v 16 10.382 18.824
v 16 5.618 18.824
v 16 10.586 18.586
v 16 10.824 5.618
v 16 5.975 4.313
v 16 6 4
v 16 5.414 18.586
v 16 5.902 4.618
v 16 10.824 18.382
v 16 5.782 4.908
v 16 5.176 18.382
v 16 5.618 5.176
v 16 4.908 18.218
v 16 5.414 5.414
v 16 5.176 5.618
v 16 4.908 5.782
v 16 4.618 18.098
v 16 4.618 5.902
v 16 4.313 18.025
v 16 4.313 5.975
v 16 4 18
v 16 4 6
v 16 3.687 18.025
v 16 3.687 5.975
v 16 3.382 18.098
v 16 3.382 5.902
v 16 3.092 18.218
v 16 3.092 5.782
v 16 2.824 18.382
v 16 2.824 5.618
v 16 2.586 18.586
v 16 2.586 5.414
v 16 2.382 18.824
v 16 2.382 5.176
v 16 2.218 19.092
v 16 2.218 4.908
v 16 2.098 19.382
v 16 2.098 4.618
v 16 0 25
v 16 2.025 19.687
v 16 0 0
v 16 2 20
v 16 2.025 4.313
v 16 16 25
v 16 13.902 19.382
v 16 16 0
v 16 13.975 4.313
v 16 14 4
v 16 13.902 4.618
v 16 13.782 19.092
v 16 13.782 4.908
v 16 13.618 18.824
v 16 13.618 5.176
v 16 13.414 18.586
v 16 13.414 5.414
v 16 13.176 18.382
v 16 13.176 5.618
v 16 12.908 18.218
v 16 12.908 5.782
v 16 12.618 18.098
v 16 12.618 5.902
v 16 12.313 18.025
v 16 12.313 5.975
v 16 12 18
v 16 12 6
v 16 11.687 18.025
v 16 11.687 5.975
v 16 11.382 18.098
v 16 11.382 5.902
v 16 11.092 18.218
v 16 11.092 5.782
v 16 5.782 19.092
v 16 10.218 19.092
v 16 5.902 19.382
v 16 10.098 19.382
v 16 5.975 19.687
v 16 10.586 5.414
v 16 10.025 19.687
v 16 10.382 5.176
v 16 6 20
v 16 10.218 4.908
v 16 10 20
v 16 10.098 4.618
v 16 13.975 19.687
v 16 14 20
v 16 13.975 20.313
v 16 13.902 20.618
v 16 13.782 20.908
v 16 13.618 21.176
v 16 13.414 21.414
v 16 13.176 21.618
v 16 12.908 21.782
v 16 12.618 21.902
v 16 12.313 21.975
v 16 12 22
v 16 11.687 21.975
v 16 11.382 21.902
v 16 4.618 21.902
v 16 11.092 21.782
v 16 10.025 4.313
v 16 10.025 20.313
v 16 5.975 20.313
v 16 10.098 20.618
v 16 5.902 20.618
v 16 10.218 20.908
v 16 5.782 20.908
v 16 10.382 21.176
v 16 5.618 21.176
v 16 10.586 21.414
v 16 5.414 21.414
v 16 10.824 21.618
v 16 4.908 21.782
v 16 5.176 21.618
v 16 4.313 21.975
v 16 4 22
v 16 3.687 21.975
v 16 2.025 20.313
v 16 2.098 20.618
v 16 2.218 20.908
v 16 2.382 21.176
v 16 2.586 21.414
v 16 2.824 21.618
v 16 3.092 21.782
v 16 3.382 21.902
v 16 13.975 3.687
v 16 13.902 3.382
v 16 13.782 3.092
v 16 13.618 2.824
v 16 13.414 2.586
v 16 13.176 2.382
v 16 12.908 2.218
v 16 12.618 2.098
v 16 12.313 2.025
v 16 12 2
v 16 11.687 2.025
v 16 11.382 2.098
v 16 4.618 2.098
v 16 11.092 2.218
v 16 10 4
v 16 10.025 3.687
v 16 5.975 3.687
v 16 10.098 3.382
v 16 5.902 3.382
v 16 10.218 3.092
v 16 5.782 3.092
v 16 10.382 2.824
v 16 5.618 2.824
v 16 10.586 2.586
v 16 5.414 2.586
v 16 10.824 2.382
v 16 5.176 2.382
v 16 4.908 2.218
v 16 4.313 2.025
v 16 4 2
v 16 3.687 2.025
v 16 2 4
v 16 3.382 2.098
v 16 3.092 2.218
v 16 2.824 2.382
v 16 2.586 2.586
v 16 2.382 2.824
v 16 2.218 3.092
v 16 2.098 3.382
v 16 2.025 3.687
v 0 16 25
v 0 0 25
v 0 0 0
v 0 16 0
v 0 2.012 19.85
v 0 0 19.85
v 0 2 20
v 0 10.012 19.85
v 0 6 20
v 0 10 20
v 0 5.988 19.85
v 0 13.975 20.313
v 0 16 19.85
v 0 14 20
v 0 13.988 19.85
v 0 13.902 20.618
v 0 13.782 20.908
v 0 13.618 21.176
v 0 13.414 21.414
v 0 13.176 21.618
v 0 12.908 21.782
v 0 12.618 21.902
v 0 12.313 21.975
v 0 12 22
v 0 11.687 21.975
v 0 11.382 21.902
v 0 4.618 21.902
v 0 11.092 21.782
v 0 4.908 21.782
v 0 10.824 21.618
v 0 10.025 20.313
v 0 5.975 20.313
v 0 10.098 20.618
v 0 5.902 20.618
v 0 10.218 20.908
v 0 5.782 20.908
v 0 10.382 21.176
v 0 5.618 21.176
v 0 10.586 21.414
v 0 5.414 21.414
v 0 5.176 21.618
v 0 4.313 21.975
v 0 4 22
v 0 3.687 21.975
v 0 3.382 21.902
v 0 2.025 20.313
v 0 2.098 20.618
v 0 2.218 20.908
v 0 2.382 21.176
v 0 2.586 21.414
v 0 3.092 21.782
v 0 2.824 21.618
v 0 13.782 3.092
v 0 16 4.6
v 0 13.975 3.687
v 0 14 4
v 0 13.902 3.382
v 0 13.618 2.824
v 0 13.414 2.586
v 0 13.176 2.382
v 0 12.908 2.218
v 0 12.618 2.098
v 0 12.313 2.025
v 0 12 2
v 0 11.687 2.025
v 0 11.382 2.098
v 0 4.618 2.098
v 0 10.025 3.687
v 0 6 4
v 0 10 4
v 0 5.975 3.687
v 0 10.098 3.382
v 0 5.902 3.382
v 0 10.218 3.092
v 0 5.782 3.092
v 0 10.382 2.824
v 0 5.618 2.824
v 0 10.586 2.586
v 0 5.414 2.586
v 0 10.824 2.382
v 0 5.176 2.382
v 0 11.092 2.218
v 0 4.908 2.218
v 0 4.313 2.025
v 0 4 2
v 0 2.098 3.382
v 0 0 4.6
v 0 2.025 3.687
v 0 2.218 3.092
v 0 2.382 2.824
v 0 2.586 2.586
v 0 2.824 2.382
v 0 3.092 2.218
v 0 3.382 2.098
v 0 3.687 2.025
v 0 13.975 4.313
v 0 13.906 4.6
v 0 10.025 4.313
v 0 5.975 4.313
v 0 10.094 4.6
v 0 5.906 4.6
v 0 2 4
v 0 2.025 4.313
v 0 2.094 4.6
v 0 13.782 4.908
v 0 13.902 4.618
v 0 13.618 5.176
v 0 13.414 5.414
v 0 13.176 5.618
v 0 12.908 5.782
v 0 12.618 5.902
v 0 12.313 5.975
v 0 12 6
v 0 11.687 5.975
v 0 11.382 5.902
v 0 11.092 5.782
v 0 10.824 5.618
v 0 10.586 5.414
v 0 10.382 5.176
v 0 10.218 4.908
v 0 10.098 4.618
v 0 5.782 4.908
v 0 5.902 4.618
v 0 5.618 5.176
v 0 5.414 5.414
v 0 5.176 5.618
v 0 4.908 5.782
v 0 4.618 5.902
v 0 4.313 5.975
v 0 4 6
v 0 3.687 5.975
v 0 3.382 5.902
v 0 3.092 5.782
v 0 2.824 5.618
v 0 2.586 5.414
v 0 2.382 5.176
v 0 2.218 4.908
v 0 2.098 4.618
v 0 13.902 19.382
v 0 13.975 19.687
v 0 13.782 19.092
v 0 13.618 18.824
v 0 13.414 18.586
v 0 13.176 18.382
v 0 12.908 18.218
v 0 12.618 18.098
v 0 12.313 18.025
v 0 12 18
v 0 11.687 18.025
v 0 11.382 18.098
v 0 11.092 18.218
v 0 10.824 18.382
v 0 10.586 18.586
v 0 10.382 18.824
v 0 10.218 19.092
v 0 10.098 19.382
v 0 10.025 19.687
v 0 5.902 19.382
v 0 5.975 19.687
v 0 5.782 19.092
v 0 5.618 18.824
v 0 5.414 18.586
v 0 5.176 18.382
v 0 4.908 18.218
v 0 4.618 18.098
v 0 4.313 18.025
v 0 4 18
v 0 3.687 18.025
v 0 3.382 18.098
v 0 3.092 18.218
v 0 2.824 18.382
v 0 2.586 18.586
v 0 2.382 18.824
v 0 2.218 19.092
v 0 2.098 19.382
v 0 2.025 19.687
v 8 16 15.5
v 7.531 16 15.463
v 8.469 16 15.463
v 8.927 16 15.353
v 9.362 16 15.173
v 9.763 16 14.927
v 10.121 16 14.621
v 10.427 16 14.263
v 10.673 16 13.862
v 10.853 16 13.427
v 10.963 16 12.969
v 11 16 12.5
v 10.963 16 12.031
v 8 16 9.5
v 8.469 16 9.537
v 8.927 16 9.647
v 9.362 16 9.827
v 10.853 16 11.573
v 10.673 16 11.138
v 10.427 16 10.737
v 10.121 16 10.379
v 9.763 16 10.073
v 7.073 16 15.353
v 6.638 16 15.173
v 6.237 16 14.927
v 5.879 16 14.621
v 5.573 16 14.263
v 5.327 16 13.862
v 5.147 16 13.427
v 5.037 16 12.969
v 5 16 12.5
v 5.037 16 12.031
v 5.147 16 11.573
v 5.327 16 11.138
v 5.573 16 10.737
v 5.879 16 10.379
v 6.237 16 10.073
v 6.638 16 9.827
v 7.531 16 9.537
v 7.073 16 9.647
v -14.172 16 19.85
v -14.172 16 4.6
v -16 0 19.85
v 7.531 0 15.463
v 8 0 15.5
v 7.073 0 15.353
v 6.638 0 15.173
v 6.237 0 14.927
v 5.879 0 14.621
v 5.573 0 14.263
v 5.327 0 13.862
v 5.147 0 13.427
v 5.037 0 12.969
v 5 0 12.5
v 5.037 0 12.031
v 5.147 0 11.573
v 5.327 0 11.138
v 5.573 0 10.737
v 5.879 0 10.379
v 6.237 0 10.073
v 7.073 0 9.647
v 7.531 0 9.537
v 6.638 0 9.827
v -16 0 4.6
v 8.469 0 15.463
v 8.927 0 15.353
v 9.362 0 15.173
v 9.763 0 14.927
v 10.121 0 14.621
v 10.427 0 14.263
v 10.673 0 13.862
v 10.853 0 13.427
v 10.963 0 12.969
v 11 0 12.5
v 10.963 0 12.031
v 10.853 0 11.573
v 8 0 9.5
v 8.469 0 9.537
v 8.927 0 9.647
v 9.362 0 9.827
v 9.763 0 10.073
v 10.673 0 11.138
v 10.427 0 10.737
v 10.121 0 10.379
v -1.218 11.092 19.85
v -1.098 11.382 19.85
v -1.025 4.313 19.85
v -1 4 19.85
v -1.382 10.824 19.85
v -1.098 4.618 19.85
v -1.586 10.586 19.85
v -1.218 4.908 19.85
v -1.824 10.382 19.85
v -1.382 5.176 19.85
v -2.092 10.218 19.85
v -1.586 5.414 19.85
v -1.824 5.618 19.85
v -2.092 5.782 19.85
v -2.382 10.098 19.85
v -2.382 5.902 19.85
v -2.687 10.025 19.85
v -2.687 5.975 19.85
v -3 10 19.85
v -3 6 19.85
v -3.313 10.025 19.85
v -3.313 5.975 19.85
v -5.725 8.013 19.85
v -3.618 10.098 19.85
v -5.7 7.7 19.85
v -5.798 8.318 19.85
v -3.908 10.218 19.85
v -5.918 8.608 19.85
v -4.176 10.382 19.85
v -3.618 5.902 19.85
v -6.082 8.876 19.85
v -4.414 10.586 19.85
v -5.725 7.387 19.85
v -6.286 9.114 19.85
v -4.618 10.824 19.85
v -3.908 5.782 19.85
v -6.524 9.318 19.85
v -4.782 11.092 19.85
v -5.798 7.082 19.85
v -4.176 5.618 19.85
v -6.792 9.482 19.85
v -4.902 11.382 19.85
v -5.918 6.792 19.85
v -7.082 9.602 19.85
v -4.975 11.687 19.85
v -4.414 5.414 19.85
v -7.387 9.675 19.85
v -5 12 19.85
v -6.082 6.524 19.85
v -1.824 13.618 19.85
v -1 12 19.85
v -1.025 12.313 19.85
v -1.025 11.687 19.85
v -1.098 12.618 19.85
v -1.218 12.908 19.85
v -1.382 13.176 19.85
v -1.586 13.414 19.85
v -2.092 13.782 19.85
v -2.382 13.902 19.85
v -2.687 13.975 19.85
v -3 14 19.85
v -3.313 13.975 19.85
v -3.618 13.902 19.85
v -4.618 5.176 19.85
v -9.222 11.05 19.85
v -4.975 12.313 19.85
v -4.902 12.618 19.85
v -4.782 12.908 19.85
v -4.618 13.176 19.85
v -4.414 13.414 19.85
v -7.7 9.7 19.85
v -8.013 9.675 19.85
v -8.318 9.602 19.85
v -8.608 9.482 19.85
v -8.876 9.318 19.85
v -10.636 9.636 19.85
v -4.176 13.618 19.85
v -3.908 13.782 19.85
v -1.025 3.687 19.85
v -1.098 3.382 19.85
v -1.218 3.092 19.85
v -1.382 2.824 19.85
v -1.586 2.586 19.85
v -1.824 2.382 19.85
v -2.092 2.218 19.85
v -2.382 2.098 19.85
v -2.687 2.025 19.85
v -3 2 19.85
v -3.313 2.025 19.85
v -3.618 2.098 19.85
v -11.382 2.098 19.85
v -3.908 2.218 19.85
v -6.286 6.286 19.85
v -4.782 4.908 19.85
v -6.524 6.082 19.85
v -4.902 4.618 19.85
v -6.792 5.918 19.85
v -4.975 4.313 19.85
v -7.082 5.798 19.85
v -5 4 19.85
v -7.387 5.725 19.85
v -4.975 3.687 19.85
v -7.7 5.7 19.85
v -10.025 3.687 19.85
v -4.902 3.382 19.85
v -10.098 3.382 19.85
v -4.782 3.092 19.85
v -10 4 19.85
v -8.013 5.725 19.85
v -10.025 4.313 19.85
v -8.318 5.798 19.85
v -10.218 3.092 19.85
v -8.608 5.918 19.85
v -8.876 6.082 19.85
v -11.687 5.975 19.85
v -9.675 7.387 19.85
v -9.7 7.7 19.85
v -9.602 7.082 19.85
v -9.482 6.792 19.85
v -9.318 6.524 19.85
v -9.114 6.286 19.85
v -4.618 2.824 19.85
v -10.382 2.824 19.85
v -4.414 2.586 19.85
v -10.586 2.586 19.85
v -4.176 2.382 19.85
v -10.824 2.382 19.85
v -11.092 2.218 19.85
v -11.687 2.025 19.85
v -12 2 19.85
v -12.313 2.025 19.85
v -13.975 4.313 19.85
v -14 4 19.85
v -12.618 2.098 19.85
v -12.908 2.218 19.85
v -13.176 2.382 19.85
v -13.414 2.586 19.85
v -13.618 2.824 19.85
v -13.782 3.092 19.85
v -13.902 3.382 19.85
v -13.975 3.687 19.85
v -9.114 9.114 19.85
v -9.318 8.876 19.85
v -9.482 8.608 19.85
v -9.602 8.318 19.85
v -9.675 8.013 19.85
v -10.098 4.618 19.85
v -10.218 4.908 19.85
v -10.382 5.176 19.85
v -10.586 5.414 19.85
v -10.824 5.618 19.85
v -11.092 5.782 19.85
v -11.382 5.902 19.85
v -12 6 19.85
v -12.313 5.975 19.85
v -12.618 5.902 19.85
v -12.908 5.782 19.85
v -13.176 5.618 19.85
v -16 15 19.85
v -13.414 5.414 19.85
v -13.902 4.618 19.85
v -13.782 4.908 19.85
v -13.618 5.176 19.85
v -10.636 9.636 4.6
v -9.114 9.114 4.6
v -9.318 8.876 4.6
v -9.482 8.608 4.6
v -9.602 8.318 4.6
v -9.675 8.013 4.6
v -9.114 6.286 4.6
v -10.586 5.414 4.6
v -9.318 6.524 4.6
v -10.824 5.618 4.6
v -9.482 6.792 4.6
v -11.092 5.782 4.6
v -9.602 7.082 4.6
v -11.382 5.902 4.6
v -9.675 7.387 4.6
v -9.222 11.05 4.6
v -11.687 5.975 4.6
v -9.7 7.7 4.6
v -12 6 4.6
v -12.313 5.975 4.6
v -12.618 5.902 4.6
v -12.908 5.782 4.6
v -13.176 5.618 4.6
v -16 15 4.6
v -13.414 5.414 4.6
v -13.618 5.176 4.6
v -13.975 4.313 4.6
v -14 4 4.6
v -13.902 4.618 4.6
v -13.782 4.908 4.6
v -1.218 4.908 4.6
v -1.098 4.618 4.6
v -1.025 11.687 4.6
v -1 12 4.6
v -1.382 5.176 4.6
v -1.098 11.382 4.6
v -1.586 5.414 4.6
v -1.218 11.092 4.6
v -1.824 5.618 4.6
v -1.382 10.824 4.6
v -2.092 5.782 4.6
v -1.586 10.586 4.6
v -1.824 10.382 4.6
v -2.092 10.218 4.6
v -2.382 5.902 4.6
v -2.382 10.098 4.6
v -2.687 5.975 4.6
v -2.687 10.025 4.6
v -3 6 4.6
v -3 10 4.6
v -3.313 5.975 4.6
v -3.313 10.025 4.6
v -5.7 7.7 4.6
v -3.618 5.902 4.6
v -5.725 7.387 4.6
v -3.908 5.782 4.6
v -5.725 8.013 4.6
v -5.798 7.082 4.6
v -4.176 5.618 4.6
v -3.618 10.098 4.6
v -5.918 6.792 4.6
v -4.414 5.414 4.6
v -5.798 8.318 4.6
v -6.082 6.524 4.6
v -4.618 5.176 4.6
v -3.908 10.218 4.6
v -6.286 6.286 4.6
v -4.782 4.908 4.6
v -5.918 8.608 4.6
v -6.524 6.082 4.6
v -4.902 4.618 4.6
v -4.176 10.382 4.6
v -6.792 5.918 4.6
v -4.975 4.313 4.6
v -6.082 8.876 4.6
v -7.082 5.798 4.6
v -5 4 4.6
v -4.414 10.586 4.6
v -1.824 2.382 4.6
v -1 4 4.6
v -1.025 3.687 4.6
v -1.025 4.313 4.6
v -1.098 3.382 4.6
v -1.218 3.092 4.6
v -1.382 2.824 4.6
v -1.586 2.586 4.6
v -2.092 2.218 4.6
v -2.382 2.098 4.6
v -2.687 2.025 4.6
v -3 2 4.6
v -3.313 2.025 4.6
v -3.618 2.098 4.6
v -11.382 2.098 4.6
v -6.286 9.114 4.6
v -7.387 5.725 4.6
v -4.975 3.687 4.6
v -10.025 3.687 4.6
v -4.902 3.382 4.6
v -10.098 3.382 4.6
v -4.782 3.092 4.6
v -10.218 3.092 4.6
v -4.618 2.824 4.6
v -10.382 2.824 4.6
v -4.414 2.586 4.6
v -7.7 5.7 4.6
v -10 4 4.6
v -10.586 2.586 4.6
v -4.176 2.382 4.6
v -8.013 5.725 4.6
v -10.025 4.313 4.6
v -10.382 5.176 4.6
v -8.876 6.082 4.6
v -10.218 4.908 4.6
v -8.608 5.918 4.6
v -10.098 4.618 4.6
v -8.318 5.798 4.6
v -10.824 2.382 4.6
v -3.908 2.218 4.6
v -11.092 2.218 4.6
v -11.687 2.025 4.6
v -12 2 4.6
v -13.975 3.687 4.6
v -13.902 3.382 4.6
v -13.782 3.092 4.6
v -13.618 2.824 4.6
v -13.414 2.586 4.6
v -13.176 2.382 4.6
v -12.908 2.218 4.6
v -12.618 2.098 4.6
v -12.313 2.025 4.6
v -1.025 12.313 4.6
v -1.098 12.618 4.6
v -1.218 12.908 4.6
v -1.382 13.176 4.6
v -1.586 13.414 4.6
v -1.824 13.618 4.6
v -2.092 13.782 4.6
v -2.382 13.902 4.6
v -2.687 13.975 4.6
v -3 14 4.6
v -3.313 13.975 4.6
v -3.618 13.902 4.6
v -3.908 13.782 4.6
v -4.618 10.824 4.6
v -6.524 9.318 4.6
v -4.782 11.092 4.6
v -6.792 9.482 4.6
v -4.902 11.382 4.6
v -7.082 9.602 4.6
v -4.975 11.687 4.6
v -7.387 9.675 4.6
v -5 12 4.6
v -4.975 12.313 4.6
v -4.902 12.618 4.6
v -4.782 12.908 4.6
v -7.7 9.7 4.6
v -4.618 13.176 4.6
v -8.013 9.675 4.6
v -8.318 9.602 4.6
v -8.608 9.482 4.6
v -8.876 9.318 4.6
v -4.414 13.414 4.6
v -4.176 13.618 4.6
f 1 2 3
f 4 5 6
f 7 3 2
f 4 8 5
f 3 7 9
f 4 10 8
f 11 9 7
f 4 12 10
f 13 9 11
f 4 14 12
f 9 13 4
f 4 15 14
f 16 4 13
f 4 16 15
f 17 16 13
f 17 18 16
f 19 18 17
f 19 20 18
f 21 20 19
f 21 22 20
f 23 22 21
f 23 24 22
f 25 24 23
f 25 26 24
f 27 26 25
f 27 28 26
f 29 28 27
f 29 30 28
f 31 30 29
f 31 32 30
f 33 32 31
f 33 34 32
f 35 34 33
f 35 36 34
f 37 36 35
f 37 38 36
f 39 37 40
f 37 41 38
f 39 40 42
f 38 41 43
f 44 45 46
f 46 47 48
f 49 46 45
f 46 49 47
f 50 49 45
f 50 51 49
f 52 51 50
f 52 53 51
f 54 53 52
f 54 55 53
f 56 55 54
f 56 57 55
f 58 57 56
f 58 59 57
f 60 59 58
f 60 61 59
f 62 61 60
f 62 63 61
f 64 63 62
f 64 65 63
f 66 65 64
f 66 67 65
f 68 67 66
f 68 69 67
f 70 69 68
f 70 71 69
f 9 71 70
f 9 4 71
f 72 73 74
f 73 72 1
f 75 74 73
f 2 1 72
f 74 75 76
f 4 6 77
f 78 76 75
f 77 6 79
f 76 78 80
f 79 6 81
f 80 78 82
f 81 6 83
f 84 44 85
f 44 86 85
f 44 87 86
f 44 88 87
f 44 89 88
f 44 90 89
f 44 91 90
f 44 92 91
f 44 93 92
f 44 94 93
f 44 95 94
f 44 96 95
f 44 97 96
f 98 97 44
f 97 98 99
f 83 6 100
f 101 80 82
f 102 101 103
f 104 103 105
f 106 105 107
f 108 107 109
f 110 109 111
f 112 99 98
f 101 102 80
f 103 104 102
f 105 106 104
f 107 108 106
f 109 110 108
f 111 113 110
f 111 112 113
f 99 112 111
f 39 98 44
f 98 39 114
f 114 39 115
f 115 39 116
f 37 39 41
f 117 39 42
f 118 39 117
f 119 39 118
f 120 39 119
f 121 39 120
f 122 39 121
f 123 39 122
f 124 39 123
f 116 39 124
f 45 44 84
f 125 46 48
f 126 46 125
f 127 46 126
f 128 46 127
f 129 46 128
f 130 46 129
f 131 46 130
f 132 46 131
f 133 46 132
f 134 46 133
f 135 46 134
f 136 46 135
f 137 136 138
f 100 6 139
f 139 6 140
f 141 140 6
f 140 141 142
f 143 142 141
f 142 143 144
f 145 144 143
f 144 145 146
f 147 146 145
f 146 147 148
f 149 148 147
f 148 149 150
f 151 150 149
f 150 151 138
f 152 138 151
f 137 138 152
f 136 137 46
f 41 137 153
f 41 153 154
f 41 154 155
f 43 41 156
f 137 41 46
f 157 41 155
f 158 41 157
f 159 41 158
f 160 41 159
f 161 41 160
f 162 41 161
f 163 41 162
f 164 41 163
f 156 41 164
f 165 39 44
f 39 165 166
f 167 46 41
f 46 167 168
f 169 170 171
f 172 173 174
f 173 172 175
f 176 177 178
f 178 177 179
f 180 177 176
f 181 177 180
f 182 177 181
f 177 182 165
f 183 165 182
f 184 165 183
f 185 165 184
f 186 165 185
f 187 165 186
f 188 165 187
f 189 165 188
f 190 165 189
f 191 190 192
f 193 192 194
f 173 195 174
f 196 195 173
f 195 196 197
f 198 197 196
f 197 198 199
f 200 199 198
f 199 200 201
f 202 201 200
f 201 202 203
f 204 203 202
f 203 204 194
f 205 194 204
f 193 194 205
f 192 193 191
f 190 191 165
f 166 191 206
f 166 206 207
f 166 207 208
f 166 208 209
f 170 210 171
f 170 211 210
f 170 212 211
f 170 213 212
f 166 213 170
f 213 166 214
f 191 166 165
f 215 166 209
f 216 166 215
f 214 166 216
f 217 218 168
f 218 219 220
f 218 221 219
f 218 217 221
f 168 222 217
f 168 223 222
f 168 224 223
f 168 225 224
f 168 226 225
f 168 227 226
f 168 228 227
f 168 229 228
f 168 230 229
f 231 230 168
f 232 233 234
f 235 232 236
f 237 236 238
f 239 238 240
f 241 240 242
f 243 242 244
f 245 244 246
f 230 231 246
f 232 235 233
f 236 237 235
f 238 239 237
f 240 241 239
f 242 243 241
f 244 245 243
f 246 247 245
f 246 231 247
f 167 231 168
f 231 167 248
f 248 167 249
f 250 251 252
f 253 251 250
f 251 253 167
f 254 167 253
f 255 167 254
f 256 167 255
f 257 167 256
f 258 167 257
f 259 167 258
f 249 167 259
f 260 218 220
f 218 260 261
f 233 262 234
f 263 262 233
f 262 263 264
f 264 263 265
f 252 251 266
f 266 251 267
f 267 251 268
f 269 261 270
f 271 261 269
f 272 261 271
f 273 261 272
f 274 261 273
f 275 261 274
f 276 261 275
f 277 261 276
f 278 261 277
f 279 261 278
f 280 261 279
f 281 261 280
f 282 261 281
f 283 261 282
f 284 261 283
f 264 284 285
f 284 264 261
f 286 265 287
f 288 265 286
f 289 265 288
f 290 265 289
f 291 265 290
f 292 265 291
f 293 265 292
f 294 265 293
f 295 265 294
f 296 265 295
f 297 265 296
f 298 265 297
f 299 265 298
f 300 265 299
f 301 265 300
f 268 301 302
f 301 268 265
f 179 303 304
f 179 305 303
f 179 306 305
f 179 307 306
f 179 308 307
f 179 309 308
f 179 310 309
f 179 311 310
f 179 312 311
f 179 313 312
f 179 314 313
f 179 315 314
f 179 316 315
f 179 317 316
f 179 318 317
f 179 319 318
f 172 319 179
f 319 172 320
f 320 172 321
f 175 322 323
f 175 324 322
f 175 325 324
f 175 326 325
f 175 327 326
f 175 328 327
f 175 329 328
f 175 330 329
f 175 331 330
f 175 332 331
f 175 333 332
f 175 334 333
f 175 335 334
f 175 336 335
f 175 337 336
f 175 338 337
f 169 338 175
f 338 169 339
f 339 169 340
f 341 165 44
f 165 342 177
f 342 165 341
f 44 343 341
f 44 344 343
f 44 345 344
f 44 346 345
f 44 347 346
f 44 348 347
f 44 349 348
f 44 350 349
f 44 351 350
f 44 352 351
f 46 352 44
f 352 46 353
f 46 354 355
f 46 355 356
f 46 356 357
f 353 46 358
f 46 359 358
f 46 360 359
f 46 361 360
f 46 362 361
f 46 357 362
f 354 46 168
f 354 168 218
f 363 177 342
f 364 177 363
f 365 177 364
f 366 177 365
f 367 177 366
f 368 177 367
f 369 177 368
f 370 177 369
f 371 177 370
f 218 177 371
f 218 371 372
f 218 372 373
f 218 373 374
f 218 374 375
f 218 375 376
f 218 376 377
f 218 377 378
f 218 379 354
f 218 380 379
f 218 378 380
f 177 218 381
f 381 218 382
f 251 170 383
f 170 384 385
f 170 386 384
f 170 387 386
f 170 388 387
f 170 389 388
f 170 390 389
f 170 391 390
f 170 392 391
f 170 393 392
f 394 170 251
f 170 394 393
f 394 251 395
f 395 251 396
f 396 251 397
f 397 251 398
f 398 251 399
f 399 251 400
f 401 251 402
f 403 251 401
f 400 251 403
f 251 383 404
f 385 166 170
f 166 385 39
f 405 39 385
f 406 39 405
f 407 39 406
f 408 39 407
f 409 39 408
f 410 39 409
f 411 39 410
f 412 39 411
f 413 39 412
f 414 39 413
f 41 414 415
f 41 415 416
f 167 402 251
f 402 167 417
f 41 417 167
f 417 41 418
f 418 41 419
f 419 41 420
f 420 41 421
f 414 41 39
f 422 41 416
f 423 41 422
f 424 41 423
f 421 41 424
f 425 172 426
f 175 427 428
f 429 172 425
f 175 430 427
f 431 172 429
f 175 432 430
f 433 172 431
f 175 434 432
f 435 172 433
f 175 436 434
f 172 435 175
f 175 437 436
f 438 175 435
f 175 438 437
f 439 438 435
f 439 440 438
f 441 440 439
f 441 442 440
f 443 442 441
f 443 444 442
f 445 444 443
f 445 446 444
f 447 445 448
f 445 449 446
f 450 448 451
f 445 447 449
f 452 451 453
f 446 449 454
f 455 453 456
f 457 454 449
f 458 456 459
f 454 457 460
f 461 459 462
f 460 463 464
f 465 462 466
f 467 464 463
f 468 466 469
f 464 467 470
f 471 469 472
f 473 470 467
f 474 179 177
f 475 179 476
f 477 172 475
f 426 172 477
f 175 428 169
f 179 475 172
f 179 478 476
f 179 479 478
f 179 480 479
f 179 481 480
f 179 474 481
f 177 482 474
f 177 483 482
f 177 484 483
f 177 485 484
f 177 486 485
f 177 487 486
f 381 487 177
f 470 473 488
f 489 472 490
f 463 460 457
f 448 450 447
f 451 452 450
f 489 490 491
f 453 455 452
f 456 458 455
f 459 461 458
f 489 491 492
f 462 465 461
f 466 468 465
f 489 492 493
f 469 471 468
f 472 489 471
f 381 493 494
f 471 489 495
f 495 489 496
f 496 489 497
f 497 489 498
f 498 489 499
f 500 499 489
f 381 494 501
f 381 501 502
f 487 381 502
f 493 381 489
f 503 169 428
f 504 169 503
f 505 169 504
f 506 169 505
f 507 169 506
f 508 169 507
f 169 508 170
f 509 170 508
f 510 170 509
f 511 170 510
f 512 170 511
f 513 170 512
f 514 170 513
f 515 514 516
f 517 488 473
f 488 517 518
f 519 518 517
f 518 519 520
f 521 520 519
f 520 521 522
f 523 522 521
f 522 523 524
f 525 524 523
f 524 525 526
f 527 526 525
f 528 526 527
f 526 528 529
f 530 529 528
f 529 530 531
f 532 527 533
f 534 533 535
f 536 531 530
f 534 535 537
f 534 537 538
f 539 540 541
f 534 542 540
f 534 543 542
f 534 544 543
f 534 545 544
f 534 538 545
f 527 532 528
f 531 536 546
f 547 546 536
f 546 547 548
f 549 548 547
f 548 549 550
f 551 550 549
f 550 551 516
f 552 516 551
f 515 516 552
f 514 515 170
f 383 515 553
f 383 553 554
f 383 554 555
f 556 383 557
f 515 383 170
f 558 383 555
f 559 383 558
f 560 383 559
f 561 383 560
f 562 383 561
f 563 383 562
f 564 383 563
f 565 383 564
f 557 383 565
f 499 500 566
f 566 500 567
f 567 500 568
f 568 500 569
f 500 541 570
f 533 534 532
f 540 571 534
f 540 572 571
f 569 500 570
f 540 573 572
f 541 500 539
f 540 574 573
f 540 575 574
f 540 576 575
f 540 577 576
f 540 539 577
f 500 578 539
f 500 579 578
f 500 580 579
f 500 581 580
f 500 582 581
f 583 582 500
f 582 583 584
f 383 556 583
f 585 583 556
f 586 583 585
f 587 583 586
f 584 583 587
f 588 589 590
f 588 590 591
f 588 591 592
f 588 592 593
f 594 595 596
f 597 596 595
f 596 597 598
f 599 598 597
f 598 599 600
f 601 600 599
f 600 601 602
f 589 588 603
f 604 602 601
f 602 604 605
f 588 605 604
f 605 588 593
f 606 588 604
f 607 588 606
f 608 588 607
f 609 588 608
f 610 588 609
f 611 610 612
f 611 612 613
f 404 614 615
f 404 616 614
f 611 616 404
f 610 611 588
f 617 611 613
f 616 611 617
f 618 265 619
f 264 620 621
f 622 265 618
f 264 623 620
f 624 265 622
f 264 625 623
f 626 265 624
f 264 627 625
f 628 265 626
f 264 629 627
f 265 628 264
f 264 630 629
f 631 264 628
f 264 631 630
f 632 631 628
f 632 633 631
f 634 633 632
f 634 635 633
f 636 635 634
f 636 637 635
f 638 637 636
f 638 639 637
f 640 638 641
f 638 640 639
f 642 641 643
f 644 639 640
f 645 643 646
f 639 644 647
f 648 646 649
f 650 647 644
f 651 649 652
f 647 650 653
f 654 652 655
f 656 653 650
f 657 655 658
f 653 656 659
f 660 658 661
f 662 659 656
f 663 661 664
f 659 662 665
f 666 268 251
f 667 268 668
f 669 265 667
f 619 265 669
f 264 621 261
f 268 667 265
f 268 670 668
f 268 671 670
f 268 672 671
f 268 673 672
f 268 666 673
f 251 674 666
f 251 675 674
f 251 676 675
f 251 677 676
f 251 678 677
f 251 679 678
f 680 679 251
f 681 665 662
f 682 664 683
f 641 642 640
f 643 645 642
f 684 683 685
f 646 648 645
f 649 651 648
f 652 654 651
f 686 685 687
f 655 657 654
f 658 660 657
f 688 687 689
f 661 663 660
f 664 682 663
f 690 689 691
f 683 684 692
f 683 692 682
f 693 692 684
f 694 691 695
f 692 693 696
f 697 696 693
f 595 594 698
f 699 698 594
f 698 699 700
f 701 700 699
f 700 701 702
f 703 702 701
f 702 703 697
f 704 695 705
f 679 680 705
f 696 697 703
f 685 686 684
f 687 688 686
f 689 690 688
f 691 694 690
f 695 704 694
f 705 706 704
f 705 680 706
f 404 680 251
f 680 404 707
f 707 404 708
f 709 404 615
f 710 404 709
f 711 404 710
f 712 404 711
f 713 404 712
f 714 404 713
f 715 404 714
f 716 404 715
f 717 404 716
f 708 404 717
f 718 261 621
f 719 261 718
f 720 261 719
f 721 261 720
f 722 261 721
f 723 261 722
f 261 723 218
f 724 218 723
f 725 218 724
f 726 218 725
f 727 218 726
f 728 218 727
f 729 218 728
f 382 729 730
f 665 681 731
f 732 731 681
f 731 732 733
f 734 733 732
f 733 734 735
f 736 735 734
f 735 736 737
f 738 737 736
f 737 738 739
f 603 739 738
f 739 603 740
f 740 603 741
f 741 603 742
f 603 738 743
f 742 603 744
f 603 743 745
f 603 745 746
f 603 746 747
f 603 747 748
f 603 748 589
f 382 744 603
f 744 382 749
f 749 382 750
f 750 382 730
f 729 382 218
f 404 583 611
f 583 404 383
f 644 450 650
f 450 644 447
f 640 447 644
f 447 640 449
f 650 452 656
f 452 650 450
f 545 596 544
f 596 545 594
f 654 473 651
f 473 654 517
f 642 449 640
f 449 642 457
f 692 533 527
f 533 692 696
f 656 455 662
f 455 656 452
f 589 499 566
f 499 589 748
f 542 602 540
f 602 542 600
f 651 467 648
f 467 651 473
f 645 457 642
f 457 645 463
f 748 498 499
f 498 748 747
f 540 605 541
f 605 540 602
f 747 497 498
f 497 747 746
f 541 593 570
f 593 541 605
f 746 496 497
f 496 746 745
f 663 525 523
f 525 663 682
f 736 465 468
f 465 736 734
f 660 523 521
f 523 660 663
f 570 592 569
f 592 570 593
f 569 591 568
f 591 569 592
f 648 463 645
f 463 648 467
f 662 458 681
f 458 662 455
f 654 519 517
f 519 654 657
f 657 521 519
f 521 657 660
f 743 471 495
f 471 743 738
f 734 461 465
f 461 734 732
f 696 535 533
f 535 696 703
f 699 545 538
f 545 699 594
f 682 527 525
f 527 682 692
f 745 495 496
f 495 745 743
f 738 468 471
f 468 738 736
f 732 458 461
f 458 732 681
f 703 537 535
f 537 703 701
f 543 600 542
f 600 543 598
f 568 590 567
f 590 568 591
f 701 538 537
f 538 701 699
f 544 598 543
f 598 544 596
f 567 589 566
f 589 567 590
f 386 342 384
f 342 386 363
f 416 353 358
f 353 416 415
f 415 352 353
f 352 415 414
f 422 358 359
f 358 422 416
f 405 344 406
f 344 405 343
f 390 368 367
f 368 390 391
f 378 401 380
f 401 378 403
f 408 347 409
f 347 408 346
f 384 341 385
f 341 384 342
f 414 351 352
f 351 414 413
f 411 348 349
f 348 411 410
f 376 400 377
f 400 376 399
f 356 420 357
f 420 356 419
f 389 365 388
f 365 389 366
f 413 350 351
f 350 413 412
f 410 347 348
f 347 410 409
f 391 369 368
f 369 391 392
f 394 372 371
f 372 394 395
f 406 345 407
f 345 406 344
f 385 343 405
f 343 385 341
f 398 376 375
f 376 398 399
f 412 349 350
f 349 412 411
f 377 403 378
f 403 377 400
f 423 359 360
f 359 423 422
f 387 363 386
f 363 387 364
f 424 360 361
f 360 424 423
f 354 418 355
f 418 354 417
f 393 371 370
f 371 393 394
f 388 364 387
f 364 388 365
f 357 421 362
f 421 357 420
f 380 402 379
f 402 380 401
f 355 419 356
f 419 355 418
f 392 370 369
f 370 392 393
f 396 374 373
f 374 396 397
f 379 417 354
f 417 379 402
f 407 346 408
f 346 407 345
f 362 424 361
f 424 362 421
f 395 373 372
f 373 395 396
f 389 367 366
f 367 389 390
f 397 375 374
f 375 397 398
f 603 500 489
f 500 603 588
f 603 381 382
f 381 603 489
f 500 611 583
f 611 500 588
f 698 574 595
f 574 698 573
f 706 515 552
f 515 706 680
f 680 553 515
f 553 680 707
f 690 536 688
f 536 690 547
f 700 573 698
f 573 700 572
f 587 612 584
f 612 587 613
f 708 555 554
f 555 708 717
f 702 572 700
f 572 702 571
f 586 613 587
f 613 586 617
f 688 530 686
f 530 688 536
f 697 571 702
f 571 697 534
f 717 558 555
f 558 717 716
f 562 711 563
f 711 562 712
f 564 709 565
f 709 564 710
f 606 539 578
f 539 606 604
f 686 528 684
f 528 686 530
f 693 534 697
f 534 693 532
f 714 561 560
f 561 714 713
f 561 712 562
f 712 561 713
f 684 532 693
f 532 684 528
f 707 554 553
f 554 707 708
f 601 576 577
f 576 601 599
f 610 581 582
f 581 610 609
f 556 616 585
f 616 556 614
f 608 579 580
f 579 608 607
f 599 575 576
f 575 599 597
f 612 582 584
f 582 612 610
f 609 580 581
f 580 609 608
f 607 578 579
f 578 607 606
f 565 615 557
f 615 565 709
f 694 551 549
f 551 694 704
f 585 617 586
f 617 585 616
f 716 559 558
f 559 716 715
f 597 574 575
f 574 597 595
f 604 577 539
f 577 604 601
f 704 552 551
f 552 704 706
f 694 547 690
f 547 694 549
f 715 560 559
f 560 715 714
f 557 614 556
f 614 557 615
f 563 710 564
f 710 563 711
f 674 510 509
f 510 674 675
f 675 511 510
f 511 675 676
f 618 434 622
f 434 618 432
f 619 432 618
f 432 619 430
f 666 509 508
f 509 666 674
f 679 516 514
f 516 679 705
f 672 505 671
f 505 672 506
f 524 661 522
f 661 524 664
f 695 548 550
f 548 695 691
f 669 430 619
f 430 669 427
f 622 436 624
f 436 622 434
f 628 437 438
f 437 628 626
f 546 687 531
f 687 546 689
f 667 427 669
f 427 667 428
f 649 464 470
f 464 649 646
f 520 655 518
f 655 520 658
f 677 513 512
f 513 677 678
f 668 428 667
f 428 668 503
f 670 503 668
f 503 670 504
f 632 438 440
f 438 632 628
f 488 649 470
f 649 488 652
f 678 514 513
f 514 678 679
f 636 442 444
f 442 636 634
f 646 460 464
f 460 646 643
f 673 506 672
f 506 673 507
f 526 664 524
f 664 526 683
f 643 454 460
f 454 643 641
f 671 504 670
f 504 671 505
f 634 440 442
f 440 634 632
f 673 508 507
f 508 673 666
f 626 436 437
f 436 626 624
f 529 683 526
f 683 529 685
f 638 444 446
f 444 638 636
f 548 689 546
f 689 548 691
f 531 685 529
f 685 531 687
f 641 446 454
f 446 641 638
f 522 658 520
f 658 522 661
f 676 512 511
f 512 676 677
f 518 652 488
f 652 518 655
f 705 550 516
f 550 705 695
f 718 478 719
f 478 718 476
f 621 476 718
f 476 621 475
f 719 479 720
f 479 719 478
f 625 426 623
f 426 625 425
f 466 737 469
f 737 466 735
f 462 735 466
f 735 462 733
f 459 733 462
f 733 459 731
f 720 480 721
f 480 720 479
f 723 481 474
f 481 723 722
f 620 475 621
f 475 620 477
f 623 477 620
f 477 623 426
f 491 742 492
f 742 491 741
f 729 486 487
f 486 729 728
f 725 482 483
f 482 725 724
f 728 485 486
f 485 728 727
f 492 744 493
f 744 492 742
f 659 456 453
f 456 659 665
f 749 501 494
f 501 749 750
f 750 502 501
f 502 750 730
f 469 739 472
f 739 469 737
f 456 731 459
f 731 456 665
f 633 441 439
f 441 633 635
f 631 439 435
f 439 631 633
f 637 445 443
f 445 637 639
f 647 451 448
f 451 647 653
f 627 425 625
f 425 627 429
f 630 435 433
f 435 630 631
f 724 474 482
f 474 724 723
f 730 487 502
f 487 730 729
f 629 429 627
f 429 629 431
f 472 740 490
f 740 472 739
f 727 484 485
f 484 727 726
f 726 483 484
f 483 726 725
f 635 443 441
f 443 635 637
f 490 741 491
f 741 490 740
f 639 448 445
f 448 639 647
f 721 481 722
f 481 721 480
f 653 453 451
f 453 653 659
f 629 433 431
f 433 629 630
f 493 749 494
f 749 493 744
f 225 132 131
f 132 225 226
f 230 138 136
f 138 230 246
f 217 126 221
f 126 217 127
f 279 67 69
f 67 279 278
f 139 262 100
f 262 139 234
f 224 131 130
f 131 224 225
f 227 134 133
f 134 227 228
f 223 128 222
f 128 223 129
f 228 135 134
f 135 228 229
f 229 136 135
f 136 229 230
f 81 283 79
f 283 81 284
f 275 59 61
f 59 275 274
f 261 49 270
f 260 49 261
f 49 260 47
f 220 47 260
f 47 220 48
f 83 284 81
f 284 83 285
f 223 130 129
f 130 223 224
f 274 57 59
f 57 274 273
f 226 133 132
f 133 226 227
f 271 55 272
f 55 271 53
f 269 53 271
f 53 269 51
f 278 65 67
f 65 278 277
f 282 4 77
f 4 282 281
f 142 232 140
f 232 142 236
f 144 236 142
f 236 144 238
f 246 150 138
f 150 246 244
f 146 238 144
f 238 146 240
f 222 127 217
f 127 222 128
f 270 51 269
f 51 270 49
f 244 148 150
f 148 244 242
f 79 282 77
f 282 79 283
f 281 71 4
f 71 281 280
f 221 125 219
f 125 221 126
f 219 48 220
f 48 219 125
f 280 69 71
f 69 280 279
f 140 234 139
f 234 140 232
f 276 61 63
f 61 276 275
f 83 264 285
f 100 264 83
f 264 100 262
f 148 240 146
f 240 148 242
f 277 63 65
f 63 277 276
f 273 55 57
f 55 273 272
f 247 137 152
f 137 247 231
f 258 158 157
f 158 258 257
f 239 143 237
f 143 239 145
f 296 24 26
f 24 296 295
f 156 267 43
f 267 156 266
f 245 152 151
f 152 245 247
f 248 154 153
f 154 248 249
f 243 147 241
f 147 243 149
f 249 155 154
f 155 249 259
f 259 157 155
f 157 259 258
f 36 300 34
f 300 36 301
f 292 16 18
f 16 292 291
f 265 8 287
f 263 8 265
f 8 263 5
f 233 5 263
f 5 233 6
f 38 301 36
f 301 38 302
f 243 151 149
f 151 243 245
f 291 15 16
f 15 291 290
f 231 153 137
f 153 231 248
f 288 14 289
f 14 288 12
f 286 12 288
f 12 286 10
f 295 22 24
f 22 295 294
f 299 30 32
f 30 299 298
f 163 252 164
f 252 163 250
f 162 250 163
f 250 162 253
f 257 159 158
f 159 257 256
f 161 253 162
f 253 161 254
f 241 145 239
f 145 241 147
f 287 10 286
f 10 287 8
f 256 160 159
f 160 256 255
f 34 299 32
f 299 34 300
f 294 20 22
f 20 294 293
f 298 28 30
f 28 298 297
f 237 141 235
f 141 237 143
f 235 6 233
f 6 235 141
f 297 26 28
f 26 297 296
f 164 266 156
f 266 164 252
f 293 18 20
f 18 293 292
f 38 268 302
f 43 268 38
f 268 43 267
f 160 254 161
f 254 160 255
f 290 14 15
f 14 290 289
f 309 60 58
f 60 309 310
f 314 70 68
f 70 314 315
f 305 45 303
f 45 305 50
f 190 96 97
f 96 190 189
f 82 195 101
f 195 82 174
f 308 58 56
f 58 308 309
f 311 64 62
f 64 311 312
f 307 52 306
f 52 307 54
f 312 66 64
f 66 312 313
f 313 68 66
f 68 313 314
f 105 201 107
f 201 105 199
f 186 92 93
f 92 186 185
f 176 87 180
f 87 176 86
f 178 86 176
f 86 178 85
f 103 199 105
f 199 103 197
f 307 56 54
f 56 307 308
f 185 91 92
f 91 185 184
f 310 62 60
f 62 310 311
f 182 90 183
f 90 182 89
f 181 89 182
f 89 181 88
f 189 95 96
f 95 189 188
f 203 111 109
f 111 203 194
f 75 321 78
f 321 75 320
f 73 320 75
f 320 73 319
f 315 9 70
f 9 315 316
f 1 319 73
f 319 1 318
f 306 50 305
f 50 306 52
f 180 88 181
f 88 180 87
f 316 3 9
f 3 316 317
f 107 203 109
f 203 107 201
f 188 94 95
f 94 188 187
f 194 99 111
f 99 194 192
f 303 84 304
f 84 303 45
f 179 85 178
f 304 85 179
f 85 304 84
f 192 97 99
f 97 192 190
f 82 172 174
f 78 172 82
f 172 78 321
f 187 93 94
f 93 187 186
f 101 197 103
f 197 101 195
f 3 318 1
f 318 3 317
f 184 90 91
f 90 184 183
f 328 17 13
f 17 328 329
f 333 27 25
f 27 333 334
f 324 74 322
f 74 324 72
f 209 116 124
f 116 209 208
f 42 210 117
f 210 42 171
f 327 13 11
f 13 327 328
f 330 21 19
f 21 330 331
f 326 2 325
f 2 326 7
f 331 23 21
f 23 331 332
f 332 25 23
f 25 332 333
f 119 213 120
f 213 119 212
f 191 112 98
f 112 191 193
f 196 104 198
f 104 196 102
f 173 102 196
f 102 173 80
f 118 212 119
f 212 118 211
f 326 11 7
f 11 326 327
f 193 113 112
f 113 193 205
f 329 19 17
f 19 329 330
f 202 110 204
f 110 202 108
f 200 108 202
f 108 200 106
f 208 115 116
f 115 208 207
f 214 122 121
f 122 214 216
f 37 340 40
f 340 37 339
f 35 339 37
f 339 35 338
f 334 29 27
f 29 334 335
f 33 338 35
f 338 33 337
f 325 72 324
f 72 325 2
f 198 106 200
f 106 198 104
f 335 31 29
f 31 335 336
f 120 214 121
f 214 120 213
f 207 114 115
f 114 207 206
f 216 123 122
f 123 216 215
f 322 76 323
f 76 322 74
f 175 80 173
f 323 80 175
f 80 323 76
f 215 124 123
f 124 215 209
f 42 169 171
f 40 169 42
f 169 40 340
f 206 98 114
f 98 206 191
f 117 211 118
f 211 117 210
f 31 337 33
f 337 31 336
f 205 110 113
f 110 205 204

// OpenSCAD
module fanscrewhole () {
    color ([1,0,0])
    cylinder(r = 2, h = 25, $fn = 40);
}
module bodyhole () {
    color ([1,0,0])
    rotate ([270,0,0])
    cylinder(r = 3, h = 25, $fn = 40);
}
module basicbody (){
    union() {
        translate ([0,0,0])  
            cube ([16, 16,25 ]);
        translate([-16,0,4.6])
            cube ([32,16,15.25 ]);
    }
}
module gabhole(){
    color ([0,1,0])
    cylinder(r = 2, h = 25, $fn = 40);
}
module cutout(){
    color ([1,0,0])
    cube ([9,2,16]);
}
    
    

difference (){
    basicbody();
    translate([-7.7,7.7,0]) fanscrewhole();
    translate([8,-1,12.5]) bodyhole();
    translate ([-17,16,4]) rotate ([0,0,-45])  cutout();
    
    translate([-12,4,0])gabhole();
    translate([-3,4,0])gabhole();
    translate([-3,12,0])gabhole();
    
    rotate([0,90,0]) translate([-4,12,0])gabhole();
    rotate([0,90,0]) translate([-4,4,0])gabhole();
    rotate([0,90,0]) translate([-20,12,0])gabhole();
    rotate([0,90,0]) translate([-20,4,0])gabhole();
}

    
